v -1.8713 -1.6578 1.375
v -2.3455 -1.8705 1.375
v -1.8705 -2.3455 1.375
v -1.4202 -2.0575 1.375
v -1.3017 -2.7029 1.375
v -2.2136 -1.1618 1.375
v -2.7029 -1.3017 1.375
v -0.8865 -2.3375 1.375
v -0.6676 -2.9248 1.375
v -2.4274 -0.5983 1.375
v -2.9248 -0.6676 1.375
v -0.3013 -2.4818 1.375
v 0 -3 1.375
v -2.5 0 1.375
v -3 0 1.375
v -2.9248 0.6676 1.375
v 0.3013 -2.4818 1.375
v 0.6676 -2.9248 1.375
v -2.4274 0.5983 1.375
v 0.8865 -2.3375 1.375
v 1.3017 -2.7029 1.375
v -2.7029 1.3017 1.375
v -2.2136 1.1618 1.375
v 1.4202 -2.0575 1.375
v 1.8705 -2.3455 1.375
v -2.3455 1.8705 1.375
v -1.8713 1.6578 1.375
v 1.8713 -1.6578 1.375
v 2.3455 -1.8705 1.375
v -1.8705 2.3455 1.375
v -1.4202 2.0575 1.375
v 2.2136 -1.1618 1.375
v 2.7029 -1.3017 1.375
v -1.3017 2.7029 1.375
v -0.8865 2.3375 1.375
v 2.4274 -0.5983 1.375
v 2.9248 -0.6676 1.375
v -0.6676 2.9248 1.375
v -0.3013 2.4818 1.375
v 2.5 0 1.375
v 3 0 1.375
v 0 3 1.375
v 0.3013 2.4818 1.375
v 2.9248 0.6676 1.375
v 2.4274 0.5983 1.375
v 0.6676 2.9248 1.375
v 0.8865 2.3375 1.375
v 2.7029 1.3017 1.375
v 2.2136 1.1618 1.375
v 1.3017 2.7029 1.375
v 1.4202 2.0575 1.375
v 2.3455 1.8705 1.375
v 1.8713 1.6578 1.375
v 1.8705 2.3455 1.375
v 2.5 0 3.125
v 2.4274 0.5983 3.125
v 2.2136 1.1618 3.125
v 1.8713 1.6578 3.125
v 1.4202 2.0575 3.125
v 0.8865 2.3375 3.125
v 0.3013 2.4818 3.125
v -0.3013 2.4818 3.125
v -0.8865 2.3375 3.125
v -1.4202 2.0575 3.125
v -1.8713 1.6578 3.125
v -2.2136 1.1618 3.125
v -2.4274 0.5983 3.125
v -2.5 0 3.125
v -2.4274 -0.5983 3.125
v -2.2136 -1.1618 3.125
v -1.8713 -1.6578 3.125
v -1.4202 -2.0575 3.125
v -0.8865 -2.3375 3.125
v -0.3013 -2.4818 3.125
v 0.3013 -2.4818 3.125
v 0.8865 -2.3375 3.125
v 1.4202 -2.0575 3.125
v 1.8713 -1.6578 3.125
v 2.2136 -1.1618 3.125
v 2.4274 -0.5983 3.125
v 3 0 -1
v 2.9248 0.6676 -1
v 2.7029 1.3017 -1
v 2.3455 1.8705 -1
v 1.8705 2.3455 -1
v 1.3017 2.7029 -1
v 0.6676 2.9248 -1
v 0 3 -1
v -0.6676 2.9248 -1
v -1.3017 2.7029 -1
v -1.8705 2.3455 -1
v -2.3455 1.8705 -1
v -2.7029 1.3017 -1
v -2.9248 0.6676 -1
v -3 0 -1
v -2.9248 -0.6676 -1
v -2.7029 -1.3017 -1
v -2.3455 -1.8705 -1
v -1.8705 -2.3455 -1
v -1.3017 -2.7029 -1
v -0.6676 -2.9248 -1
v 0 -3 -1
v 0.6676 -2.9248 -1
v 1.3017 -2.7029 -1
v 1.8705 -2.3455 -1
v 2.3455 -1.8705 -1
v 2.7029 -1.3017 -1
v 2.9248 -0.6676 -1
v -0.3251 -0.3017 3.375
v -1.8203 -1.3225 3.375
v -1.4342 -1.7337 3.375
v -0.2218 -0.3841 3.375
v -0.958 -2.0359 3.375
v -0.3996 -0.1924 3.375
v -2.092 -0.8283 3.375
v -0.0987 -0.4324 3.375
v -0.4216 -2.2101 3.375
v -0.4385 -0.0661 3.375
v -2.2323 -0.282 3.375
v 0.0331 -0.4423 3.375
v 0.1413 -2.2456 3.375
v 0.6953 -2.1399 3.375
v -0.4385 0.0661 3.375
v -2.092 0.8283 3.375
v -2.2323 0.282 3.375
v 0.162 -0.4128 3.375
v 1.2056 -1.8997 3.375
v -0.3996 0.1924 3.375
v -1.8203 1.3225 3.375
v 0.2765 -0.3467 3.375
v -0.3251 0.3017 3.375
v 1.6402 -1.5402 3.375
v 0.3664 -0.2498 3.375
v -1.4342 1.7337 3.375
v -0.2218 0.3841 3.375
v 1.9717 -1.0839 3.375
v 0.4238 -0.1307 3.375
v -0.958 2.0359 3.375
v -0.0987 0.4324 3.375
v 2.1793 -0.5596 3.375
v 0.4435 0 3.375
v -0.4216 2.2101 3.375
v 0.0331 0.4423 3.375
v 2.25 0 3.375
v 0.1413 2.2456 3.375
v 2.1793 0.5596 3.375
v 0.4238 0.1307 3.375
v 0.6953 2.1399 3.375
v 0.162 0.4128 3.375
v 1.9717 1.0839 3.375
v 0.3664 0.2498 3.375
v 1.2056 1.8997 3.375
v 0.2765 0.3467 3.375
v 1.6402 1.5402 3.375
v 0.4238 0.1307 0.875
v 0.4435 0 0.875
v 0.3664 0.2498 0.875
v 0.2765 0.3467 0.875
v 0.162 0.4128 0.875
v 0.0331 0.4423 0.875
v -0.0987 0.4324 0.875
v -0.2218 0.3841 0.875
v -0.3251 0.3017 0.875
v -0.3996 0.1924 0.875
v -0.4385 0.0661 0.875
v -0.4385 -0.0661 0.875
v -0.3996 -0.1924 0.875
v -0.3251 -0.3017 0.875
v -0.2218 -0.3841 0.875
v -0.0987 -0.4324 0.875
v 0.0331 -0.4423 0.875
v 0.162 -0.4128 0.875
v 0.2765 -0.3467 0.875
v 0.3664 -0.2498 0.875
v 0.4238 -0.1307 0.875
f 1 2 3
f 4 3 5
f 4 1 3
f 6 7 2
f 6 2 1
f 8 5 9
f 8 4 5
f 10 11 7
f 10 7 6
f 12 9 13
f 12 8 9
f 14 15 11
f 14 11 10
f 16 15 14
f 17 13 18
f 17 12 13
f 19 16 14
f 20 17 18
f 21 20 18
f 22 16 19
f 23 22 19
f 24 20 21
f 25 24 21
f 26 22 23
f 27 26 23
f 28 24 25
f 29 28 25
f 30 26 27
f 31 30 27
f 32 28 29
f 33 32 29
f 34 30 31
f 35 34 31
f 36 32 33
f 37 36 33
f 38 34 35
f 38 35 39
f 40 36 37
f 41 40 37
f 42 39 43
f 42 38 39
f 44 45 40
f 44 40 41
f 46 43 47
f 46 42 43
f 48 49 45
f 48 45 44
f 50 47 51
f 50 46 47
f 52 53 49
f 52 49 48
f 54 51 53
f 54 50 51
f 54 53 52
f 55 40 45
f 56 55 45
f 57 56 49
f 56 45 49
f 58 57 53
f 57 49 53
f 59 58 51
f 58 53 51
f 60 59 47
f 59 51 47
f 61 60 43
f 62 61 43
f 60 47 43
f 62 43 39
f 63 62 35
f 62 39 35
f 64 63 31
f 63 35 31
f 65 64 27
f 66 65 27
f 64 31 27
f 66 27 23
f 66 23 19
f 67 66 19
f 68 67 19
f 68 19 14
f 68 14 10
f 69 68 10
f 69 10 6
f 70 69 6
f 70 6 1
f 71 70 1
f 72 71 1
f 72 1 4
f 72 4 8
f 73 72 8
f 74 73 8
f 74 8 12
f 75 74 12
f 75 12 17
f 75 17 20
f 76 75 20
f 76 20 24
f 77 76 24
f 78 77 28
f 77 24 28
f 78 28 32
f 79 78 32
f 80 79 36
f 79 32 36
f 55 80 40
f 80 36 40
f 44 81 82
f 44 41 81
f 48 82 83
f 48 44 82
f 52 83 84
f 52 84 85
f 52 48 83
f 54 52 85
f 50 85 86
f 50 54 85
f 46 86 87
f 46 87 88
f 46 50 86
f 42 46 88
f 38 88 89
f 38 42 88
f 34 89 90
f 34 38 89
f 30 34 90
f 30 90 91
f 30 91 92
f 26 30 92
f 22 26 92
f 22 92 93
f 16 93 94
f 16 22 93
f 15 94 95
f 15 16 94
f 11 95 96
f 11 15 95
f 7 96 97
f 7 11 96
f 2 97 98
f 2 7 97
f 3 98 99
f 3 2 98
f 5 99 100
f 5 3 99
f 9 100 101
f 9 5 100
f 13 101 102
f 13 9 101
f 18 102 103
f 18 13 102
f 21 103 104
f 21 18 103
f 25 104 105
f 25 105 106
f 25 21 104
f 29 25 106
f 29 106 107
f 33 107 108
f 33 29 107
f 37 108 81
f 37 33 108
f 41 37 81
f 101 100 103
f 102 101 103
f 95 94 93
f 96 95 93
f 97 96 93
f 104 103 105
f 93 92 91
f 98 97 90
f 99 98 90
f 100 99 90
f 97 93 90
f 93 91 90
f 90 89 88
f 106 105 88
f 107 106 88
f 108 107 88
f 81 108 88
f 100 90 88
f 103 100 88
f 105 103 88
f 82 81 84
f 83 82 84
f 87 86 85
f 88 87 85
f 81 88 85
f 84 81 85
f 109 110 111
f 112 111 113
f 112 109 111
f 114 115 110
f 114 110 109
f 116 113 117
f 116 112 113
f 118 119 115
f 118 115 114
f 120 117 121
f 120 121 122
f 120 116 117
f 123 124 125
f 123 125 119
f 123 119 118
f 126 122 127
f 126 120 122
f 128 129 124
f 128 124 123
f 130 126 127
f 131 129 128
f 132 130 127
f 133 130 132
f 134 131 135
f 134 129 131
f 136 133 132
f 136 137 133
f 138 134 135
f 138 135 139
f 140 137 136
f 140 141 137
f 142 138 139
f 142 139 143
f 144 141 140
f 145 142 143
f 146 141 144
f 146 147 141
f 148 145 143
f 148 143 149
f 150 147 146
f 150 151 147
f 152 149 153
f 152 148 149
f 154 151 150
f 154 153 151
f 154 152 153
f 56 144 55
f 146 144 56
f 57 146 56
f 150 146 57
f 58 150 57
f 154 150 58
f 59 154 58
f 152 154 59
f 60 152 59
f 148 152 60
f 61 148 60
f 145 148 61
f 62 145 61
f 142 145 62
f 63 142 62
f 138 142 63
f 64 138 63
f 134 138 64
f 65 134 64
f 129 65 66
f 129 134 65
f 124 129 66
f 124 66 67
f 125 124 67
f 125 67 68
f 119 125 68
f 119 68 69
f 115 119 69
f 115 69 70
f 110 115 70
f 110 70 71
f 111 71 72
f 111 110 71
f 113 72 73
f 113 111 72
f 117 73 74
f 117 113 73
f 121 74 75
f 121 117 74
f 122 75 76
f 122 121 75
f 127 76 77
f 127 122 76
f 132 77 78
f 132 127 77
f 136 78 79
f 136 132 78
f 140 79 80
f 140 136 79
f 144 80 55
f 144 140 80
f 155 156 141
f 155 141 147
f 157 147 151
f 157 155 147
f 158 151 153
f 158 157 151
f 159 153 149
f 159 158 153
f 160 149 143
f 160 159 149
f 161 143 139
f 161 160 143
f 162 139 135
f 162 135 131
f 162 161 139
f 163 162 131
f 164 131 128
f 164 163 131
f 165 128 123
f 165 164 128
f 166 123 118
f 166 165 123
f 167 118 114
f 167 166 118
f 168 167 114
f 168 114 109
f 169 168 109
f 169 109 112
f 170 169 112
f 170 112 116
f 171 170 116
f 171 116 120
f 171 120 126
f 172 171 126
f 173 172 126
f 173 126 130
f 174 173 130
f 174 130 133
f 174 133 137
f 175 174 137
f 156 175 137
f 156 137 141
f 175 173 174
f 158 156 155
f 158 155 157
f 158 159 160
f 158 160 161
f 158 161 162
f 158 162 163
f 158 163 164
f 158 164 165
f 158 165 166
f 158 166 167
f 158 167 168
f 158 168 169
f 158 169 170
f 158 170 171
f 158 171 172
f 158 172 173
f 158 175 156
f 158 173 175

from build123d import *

# Parameters (mm, degrees)
F0_R     = 2.5
F0_R_2   = 0.4435
F1_DEPTH = 3.375
F0_R_3   = 3
F2_DEPTH = 1.375
F3_DEPTH = 0.875
F4_SIZE  = 0.25
F5_DEPTH = 1


with BuildPart() as f1:
    # F0 (on Top) → F1 (new body)
    with BuildSketch(Plane.XY):
        Circle(F0_R)
        Circle(F0_R_2, mode=Mode.SUBTRACT)
    extrude(amount=F1_DEPTH)

    # F0 (on Top) → F2 (join)
    with BuildSketch(Plane.XY):
        Circle(F0_R_3)
        Circle(F0_R, mode=Mode.SUBTRACT)
    extrude(amount=F2_DEPTH)

    # F0 (on Top) → F3 (join)
    with BuildSketch(Plane.XY):
        Circle(F0_R_2)
    extrude(amount=F3_DEPTH)

    # F4
    f4_edges = [f1.edges().sort_by_distance(p)[0] for p in [
        (-2.5, 0, 3.375),
    ]]
    chamfer(f4_edges, length=F4_SIZE)

    # F0 (on Top) → F5 (join)
    with BuildSketch(Plane.XY):
        Circle(F0_R_3)
        Circle(F0_R, mode=Mode.SUBTRACT)
        Circle(F0_R)
        Circle(F0_R_2, mode=Mode.SUBTRACT)
        Circle(F0_R_2)
    extrude(amount=-F5_DEPTH)

    # F6 (on Right) → F7 (revolve, cut)
    with BuildSketch(Plane.YZ):
        Polygon((-6.6943974234, 0.9619678603), (-6.6943974234, 0), (-3.1168663409, 0.9619678603), align=None)
    revolve(axis=Axis((0, 0, 0.9346584557), (0, 0, 1)), mode=Mode.SUBTRACT)


solid = f1.part
